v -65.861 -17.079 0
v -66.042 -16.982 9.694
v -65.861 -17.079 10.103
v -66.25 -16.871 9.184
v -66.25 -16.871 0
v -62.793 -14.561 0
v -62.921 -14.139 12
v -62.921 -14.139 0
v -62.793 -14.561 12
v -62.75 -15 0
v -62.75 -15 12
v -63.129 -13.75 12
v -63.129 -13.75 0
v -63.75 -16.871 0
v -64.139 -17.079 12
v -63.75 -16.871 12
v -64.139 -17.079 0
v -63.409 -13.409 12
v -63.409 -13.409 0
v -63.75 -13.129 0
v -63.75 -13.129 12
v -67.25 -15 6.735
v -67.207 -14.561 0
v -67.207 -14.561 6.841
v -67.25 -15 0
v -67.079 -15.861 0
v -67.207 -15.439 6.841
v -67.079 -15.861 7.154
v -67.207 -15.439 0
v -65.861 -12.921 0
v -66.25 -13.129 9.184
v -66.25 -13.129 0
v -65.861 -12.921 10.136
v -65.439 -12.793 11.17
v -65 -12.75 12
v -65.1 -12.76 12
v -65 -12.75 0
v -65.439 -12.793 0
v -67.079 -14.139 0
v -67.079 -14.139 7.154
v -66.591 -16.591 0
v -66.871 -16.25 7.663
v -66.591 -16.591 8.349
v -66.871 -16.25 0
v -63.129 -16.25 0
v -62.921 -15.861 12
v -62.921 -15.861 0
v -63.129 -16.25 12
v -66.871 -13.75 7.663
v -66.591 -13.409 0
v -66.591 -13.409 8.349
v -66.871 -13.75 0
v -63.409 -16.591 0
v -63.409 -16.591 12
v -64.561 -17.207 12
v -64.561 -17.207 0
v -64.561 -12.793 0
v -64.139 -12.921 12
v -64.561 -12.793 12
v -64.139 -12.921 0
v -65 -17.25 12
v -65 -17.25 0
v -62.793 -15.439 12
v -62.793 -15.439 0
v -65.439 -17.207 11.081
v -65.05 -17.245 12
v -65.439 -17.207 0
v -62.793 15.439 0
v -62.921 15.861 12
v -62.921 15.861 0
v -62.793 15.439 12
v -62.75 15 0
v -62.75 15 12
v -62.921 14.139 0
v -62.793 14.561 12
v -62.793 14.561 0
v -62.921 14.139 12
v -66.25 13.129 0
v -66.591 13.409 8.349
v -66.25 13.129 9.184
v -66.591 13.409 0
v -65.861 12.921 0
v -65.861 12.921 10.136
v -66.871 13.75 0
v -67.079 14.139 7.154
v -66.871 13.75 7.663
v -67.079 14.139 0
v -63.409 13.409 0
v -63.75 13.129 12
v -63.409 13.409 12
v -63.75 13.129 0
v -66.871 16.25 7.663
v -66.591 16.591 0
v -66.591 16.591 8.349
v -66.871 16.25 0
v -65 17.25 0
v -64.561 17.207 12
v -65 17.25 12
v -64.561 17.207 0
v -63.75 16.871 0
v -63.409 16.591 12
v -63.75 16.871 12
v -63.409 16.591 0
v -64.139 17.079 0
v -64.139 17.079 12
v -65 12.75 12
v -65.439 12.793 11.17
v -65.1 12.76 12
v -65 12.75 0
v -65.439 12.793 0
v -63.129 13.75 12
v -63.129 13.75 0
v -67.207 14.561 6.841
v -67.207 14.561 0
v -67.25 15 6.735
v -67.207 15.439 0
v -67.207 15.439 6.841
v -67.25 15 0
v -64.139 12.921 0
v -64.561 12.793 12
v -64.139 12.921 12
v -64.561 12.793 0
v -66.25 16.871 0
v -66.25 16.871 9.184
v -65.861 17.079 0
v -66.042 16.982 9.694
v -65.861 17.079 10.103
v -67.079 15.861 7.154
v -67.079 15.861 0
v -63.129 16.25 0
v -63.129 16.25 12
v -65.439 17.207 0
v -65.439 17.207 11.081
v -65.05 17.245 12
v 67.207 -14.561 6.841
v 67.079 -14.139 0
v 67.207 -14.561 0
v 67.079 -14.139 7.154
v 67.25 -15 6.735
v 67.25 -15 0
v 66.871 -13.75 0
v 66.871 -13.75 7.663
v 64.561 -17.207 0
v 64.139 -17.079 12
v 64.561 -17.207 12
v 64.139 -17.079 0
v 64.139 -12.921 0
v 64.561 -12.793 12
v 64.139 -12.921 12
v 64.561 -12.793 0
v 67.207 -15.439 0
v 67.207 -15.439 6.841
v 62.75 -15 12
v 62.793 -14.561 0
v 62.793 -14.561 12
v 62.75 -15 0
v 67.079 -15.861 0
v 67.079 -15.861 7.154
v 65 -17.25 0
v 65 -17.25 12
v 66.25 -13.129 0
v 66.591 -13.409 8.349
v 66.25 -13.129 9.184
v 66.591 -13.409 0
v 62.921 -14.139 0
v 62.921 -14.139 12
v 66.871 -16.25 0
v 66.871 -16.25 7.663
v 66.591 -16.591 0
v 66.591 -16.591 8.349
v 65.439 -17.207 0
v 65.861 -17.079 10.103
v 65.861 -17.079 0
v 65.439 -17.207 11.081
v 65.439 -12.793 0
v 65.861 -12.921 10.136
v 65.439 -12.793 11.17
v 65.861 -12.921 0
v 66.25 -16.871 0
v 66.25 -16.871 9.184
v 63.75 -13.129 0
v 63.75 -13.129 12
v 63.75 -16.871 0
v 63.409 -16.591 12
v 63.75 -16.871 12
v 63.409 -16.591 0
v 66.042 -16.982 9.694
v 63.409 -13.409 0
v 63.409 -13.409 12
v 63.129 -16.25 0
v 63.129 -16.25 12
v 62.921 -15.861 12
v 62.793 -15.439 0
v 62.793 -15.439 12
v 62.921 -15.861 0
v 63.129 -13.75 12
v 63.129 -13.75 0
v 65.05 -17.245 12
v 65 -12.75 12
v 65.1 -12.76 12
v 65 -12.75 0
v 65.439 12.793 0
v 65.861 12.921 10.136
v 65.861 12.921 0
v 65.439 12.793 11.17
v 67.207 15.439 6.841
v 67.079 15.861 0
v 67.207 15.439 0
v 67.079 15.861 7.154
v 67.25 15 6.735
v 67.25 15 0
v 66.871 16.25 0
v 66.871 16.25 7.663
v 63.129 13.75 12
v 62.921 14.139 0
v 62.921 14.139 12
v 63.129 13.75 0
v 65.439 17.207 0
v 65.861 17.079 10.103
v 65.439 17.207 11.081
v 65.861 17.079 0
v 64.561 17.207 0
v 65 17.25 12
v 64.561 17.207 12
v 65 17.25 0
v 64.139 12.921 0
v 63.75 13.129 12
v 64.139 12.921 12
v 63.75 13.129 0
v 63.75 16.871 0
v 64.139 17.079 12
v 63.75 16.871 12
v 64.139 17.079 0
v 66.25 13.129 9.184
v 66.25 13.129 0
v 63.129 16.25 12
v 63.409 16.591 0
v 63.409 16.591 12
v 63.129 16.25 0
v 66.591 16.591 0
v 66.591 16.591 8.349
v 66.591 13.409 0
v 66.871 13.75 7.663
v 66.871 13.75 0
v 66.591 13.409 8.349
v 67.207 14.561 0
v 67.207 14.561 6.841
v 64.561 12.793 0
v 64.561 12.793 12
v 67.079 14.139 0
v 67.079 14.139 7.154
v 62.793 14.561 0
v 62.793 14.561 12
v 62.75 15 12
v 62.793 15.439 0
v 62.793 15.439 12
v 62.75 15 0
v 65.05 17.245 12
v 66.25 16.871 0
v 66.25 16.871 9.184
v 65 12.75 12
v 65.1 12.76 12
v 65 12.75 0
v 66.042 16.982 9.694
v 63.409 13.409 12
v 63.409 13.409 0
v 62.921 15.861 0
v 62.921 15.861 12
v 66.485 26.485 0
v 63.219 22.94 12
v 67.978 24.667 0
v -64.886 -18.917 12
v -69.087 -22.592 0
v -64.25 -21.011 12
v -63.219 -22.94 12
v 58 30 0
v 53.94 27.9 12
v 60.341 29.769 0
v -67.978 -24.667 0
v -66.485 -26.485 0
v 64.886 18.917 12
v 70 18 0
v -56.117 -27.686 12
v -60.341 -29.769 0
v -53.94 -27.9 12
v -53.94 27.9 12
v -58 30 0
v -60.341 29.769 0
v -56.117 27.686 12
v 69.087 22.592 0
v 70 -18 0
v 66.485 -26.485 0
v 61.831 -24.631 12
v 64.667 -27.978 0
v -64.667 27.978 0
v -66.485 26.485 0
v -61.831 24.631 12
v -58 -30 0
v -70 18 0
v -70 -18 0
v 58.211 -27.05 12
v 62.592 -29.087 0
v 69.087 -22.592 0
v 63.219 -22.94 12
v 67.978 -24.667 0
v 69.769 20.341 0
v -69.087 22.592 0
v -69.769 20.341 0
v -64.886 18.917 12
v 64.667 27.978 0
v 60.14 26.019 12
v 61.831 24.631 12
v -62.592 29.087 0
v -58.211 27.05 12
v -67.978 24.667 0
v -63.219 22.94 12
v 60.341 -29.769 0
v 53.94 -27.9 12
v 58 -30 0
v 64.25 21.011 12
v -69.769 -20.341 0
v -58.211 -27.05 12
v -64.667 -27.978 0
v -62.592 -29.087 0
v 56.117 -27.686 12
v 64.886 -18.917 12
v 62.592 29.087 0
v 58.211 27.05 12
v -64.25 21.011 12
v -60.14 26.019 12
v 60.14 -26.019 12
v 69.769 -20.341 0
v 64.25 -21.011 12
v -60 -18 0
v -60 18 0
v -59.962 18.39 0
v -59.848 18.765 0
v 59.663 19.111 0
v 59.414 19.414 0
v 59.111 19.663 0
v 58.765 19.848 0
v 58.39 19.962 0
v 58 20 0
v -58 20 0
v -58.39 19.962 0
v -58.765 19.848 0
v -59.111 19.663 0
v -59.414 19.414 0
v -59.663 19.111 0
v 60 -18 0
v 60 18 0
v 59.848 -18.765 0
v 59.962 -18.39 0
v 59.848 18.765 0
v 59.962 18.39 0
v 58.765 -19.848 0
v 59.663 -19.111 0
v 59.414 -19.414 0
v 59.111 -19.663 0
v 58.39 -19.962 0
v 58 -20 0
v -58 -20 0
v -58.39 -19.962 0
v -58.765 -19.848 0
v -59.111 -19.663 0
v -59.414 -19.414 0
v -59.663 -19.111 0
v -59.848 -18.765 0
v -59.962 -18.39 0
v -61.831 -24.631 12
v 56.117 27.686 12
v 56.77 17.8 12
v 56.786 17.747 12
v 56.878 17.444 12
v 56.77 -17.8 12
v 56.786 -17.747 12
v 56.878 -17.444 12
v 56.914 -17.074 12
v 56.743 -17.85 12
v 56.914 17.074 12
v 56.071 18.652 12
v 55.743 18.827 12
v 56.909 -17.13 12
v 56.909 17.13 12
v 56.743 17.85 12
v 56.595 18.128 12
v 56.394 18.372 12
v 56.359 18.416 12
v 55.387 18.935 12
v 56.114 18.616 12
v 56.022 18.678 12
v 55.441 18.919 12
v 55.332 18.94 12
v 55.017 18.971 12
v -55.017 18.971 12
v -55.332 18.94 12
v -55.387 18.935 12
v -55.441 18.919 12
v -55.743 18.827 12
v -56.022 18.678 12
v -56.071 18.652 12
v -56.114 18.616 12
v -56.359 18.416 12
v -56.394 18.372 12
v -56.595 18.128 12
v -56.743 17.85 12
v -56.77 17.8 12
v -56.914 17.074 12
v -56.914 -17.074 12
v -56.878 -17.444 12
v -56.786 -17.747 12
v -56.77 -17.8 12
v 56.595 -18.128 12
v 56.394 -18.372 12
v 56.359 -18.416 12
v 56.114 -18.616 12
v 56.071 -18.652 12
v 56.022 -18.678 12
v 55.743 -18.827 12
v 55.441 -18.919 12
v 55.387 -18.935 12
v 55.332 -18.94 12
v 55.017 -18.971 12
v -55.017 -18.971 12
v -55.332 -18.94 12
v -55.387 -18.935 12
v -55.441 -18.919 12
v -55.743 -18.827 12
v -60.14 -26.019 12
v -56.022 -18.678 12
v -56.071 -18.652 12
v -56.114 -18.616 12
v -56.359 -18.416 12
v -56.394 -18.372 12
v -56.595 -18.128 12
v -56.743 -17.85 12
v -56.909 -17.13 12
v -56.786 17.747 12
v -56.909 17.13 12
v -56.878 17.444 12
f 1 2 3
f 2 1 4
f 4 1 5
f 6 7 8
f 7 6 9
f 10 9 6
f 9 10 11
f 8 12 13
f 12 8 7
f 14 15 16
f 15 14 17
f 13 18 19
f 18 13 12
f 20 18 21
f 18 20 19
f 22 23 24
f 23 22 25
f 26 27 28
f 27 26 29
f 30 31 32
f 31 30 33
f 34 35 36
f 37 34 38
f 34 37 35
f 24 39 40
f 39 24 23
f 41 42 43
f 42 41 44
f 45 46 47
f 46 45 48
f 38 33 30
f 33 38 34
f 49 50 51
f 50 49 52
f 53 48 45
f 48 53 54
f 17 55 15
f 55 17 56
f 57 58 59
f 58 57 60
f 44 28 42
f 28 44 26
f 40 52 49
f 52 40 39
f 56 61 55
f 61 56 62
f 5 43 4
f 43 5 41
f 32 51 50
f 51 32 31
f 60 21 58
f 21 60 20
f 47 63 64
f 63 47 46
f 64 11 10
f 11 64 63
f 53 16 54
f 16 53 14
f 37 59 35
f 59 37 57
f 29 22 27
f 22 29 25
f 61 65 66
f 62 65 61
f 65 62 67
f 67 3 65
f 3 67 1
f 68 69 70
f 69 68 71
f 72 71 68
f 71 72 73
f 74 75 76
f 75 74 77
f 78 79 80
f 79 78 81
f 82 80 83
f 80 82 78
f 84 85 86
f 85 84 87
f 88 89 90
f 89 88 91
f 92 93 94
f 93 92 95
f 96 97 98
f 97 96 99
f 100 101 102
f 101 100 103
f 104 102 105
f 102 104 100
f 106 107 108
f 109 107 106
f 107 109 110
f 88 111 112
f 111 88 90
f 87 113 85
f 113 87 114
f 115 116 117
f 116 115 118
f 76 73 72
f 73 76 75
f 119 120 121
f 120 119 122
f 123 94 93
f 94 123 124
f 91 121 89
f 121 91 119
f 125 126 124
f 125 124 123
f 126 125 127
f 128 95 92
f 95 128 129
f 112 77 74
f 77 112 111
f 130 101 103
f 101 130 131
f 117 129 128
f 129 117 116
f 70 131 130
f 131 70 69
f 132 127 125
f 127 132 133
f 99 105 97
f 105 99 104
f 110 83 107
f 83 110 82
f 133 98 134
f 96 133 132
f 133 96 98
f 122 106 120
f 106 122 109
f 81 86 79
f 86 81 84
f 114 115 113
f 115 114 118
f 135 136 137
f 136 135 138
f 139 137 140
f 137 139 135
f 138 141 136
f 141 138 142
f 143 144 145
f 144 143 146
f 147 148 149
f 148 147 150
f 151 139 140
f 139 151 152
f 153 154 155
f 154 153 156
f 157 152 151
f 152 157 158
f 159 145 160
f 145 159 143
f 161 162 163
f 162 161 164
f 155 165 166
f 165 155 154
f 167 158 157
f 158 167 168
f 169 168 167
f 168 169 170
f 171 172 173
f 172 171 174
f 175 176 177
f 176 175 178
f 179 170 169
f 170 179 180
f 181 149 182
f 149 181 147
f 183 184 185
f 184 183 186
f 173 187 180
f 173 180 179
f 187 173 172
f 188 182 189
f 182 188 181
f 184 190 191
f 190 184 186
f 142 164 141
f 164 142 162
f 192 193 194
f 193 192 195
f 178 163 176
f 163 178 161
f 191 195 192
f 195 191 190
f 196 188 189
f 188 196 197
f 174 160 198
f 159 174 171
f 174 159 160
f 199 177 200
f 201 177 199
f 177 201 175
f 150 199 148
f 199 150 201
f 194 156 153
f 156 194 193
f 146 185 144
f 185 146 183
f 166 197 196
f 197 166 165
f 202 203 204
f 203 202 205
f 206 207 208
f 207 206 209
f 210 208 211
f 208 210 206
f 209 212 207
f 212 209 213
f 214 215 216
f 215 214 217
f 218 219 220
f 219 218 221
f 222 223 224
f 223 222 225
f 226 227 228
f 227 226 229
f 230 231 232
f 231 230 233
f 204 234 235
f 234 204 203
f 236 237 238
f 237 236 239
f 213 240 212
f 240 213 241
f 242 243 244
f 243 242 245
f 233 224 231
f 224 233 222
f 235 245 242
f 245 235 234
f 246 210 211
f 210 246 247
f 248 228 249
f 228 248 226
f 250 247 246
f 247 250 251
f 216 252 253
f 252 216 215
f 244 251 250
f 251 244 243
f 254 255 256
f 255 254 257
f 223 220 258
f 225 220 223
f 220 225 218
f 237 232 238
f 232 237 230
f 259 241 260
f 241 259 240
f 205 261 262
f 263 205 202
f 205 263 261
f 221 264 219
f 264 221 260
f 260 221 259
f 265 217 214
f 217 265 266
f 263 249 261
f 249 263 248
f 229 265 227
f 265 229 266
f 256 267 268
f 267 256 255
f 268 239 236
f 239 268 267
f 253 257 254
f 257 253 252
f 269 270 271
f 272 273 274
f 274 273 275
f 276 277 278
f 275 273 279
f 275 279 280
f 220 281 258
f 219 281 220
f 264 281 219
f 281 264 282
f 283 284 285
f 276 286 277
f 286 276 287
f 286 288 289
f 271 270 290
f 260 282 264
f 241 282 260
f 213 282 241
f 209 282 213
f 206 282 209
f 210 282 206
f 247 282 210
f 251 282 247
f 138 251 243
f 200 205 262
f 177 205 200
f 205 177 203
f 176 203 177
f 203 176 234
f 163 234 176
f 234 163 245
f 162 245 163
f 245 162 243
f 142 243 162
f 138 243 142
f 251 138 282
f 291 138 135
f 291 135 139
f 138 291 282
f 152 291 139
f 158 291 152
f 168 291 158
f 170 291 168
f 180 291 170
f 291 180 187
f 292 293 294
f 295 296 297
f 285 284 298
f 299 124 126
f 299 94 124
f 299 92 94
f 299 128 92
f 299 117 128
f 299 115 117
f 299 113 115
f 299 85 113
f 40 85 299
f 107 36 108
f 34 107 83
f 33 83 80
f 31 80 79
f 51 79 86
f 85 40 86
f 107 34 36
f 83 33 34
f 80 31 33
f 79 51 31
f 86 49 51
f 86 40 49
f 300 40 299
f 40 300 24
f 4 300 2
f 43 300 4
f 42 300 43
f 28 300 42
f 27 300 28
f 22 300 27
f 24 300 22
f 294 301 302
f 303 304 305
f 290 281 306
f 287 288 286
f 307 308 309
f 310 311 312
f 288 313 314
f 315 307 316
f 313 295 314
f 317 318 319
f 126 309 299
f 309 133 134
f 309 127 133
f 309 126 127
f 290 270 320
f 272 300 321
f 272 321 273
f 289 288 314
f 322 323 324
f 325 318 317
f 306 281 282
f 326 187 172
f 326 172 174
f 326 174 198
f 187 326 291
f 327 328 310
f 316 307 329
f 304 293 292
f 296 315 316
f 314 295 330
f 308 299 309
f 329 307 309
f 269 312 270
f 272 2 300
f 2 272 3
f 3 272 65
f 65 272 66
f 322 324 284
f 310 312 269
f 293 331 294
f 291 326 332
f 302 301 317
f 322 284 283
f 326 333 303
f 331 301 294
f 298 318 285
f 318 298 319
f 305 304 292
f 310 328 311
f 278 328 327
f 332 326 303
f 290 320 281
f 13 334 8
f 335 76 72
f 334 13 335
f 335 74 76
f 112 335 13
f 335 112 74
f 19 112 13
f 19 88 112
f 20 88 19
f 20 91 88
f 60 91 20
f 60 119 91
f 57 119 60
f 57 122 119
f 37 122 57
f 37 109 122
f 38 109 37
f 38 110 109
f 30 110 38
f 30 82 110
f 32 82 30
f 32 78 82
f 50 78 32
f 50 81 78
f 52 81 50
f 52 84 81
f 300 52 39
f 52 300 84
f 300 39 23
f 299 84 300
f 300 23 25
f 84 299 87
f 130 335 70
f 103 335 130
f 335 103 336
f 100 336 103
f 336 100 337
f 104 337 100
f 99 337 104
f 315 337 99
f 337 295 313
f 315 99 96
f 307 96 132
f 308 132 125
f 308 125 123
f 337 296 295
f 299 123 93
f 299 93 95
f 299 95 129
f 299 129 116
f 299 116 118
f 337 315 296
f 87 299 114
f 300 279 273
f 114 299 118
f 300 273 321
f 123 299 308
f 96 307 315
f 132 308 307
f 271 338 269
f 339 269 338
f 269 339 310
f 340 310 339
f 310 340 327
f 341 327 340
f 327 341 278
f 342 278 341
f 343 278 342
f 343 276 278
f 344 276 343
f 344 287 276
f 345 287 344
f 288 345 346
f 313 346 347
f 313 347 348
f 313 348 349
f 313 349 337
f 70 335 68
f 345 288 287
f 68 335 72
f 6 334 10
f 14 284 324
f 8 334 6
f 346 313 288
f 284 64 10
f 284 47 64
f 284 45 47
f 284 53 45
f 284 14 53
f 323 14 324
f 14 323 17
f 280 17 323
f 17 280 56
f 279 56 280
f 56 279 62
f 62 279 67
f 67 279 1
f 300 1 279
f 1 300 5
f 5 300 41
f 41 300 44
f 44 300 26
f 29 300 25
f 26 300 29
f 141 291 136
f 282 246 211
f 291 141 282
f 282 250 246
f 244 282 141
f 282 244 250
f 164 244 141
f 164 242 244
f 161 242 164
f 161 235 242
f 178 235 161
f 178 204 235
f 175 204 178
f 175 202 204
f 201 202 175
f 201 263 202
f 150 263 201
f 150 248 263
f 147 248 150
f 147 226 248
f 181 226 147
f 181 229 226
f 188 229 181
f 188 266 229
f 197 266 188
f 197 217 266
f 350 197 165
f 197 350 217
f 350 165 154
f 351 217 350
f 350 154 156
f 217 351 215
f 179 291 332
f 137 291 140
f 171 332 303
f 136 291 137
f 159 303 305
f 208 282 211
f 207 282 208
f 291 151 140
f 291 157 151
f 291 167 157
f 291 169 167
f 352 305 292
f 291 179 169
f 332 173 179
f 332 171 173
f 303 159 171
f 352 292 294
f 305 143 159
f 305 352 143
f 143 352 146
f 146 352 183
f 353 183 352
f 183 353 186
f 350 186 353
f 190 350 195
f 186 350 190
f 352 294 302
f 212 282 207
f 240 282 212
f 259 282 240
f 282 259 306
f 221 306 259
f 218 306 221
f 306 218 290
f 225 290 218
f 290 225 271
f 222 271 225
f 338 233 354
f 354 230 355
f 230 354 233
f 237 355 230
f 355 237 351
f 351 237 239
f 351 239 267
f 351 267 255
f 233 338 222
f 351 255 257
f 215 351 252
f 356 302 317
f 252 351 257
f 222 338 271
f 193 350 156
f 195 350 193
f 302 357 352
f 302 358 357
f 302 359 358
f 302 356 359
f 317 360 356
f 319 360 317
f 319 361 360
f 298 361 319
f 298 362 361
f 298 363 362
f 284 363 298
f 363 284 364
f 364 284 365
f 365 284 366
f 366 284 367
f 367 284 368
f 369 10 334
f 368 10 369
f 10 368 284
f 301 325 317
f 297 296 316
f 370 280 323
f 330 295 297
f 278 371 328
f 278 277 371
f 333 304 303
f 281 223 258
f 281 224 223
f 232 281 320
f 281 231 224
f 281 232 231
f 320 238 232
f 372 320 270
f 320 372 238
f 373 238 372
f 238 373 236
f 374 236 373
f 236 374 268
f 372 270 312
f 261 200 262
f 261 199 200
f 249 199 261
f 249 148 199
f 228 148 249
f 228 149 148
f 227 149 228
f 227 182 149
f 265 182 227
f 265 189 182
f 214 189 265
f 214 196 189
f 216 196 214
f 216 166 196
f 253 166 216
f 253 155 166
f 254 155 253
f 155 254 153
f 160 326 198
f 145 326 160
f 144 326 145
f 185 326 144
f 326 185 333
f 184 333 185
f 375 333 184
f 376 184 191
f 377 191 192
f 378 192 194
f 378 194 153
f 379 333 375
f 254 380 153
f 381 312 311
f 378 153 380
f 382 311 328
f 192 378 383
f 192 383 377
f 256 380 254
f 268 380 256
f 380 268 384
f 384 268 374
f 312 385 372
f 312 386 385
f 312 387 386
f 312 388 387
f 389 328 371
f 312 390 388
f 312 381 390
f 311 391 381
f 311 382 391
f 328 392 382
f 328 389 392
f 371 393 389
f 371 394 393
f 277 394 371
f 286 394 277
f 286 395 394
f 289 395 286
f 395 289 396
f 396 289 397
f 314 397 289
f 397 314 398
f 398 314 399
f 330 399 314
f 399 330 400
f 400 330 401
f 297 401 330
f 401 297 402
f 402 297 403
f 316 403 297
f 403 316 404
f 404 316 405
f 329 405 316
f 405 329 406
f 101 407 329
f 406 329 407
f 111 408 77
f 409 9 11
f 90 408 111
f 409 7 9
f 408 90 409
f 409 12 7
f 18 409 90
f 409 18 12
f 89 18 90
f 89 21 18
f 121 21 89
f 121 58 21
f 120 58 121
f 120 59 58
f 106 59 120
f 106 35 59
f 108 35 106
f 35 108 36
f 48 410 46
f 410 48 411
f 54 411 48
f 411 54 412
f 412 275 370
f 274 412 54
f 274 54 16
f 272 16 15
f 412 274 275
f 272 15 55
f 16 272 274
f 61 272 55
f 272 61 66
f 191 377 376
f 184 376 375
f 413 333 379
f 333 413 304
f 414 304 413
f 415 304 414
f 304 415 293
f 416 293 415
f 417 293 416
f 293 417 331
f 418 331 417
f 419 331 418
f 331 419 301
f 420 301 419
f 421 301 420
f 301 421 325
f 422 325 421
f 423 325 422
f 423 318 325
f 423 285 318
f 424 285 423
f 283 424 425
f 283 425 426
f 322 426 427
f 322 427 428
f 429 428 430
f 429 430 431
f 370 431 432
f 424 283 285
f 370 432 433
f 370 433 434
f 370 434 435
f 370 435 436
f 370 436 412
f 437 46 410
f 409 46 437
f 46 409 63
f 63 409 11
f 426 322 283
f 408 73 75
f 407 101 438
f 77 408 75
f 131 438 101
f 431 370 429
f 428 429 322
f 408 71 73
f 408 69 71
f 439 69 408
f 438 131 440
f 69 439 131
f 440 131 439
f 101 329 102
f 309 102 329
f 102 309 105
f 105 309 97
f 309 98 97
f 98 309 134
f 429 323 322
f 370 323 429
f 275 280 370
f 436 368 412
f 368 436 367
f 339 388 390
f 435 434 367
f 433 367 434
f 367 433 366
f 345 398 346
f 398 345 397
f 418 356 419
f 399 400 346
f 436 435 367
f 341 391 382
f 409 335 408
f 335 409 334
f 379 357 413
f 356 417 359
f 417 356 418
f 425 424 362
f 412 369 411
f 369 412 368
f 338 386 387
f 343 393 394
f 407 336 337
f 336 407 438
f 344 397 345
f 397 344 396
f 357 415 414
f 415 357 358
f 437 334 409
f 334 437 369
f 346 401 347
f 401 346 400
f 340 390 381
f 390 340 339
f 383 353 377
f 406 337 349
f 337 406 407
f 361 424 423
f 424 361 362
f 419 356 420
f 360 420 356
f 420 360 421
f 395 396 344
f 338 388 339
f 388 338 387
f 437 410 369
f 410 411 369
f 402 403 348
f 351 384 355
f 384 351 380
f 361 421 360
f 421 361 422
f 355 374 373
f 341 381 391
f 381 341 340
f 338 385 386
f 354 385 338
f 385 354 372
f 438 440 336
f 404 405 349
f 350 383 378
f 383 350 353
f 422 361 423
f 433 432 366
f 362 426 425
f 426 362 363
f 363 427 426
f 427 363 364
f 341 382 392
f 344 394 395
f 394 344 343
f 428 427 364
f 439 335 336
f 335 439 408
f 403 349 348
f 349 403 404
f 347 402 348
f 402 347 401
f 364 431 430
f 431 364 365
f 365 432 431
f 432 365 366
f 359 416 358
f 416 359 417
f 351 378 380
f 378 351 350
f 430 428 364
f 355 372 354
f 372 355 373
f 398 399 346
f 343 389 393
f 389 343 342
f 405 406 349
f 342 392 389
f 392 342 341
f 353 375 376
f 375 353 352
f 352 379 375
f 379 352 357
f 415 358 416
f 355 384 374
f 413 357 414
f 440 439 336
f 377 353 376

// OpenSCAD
$fn = 32;

// ----------------------------------------------------------------------
// Display bezel: 140 x 60 mm frame, opening 120x40 mm
// ----------------------------------------------------------------------

// --- parameters (mm) ---
length = 140;             // frame outside length, X
width = 60;               // frame outside width, Y
frame_w = 10;             // frame width
thickness = 12;           // frame thickness
corner_r = 12;            // outside corner radius
chamfer = 0.93;           // outer wall taper
funnel = 0.94;            // inner opening taper
opening_l = 120;          // opening length
opening_w = 40;           // opening width
inner_r = 2;              // opening corner radius
hole_d = 4.5;             // mounting screw clearance
holes_per_side = 2;       // holes per short side
hole_inset = 5;           // hole centre inset from the outside edge

/* rounded-rectangle outlines, generated with loops */
module rounded_ring(l_nom, w_nom, r) {
  hull() {
    for (sx = [-1, 1]) for (sy = [-1, 1])
      translate([sx * (l_nom / 2 - r), sy * (w_nom / 2 - r)]) circle(r = r);
  }
}

difference() {
  /* frame body, drafted so the outer edge is a variable-depth chamfer */
  linear_extrude(height = thickness, scale = chamfer)
    rounded_ring(length, width, corner_r);
  /* viewing opening, drafted the other way for a funnel edge */
  linear_extrude(height = thickness + 2, scale = funnel)
    translate([0, 0, -1]) rounded_ring(opening_l, opening_w, inner_r);
  /* mounting screws through the frame lands */
  for (sx = [-1, 1]) for (i = [1 : holes_per_side])
    translate([sx * (length / 2 - hole_inset),
               (i - (holes_per_side + 1) / 2) * width * 0.5, -1])
      cylinder(h = thickness + 2, d = hole_d);
}
